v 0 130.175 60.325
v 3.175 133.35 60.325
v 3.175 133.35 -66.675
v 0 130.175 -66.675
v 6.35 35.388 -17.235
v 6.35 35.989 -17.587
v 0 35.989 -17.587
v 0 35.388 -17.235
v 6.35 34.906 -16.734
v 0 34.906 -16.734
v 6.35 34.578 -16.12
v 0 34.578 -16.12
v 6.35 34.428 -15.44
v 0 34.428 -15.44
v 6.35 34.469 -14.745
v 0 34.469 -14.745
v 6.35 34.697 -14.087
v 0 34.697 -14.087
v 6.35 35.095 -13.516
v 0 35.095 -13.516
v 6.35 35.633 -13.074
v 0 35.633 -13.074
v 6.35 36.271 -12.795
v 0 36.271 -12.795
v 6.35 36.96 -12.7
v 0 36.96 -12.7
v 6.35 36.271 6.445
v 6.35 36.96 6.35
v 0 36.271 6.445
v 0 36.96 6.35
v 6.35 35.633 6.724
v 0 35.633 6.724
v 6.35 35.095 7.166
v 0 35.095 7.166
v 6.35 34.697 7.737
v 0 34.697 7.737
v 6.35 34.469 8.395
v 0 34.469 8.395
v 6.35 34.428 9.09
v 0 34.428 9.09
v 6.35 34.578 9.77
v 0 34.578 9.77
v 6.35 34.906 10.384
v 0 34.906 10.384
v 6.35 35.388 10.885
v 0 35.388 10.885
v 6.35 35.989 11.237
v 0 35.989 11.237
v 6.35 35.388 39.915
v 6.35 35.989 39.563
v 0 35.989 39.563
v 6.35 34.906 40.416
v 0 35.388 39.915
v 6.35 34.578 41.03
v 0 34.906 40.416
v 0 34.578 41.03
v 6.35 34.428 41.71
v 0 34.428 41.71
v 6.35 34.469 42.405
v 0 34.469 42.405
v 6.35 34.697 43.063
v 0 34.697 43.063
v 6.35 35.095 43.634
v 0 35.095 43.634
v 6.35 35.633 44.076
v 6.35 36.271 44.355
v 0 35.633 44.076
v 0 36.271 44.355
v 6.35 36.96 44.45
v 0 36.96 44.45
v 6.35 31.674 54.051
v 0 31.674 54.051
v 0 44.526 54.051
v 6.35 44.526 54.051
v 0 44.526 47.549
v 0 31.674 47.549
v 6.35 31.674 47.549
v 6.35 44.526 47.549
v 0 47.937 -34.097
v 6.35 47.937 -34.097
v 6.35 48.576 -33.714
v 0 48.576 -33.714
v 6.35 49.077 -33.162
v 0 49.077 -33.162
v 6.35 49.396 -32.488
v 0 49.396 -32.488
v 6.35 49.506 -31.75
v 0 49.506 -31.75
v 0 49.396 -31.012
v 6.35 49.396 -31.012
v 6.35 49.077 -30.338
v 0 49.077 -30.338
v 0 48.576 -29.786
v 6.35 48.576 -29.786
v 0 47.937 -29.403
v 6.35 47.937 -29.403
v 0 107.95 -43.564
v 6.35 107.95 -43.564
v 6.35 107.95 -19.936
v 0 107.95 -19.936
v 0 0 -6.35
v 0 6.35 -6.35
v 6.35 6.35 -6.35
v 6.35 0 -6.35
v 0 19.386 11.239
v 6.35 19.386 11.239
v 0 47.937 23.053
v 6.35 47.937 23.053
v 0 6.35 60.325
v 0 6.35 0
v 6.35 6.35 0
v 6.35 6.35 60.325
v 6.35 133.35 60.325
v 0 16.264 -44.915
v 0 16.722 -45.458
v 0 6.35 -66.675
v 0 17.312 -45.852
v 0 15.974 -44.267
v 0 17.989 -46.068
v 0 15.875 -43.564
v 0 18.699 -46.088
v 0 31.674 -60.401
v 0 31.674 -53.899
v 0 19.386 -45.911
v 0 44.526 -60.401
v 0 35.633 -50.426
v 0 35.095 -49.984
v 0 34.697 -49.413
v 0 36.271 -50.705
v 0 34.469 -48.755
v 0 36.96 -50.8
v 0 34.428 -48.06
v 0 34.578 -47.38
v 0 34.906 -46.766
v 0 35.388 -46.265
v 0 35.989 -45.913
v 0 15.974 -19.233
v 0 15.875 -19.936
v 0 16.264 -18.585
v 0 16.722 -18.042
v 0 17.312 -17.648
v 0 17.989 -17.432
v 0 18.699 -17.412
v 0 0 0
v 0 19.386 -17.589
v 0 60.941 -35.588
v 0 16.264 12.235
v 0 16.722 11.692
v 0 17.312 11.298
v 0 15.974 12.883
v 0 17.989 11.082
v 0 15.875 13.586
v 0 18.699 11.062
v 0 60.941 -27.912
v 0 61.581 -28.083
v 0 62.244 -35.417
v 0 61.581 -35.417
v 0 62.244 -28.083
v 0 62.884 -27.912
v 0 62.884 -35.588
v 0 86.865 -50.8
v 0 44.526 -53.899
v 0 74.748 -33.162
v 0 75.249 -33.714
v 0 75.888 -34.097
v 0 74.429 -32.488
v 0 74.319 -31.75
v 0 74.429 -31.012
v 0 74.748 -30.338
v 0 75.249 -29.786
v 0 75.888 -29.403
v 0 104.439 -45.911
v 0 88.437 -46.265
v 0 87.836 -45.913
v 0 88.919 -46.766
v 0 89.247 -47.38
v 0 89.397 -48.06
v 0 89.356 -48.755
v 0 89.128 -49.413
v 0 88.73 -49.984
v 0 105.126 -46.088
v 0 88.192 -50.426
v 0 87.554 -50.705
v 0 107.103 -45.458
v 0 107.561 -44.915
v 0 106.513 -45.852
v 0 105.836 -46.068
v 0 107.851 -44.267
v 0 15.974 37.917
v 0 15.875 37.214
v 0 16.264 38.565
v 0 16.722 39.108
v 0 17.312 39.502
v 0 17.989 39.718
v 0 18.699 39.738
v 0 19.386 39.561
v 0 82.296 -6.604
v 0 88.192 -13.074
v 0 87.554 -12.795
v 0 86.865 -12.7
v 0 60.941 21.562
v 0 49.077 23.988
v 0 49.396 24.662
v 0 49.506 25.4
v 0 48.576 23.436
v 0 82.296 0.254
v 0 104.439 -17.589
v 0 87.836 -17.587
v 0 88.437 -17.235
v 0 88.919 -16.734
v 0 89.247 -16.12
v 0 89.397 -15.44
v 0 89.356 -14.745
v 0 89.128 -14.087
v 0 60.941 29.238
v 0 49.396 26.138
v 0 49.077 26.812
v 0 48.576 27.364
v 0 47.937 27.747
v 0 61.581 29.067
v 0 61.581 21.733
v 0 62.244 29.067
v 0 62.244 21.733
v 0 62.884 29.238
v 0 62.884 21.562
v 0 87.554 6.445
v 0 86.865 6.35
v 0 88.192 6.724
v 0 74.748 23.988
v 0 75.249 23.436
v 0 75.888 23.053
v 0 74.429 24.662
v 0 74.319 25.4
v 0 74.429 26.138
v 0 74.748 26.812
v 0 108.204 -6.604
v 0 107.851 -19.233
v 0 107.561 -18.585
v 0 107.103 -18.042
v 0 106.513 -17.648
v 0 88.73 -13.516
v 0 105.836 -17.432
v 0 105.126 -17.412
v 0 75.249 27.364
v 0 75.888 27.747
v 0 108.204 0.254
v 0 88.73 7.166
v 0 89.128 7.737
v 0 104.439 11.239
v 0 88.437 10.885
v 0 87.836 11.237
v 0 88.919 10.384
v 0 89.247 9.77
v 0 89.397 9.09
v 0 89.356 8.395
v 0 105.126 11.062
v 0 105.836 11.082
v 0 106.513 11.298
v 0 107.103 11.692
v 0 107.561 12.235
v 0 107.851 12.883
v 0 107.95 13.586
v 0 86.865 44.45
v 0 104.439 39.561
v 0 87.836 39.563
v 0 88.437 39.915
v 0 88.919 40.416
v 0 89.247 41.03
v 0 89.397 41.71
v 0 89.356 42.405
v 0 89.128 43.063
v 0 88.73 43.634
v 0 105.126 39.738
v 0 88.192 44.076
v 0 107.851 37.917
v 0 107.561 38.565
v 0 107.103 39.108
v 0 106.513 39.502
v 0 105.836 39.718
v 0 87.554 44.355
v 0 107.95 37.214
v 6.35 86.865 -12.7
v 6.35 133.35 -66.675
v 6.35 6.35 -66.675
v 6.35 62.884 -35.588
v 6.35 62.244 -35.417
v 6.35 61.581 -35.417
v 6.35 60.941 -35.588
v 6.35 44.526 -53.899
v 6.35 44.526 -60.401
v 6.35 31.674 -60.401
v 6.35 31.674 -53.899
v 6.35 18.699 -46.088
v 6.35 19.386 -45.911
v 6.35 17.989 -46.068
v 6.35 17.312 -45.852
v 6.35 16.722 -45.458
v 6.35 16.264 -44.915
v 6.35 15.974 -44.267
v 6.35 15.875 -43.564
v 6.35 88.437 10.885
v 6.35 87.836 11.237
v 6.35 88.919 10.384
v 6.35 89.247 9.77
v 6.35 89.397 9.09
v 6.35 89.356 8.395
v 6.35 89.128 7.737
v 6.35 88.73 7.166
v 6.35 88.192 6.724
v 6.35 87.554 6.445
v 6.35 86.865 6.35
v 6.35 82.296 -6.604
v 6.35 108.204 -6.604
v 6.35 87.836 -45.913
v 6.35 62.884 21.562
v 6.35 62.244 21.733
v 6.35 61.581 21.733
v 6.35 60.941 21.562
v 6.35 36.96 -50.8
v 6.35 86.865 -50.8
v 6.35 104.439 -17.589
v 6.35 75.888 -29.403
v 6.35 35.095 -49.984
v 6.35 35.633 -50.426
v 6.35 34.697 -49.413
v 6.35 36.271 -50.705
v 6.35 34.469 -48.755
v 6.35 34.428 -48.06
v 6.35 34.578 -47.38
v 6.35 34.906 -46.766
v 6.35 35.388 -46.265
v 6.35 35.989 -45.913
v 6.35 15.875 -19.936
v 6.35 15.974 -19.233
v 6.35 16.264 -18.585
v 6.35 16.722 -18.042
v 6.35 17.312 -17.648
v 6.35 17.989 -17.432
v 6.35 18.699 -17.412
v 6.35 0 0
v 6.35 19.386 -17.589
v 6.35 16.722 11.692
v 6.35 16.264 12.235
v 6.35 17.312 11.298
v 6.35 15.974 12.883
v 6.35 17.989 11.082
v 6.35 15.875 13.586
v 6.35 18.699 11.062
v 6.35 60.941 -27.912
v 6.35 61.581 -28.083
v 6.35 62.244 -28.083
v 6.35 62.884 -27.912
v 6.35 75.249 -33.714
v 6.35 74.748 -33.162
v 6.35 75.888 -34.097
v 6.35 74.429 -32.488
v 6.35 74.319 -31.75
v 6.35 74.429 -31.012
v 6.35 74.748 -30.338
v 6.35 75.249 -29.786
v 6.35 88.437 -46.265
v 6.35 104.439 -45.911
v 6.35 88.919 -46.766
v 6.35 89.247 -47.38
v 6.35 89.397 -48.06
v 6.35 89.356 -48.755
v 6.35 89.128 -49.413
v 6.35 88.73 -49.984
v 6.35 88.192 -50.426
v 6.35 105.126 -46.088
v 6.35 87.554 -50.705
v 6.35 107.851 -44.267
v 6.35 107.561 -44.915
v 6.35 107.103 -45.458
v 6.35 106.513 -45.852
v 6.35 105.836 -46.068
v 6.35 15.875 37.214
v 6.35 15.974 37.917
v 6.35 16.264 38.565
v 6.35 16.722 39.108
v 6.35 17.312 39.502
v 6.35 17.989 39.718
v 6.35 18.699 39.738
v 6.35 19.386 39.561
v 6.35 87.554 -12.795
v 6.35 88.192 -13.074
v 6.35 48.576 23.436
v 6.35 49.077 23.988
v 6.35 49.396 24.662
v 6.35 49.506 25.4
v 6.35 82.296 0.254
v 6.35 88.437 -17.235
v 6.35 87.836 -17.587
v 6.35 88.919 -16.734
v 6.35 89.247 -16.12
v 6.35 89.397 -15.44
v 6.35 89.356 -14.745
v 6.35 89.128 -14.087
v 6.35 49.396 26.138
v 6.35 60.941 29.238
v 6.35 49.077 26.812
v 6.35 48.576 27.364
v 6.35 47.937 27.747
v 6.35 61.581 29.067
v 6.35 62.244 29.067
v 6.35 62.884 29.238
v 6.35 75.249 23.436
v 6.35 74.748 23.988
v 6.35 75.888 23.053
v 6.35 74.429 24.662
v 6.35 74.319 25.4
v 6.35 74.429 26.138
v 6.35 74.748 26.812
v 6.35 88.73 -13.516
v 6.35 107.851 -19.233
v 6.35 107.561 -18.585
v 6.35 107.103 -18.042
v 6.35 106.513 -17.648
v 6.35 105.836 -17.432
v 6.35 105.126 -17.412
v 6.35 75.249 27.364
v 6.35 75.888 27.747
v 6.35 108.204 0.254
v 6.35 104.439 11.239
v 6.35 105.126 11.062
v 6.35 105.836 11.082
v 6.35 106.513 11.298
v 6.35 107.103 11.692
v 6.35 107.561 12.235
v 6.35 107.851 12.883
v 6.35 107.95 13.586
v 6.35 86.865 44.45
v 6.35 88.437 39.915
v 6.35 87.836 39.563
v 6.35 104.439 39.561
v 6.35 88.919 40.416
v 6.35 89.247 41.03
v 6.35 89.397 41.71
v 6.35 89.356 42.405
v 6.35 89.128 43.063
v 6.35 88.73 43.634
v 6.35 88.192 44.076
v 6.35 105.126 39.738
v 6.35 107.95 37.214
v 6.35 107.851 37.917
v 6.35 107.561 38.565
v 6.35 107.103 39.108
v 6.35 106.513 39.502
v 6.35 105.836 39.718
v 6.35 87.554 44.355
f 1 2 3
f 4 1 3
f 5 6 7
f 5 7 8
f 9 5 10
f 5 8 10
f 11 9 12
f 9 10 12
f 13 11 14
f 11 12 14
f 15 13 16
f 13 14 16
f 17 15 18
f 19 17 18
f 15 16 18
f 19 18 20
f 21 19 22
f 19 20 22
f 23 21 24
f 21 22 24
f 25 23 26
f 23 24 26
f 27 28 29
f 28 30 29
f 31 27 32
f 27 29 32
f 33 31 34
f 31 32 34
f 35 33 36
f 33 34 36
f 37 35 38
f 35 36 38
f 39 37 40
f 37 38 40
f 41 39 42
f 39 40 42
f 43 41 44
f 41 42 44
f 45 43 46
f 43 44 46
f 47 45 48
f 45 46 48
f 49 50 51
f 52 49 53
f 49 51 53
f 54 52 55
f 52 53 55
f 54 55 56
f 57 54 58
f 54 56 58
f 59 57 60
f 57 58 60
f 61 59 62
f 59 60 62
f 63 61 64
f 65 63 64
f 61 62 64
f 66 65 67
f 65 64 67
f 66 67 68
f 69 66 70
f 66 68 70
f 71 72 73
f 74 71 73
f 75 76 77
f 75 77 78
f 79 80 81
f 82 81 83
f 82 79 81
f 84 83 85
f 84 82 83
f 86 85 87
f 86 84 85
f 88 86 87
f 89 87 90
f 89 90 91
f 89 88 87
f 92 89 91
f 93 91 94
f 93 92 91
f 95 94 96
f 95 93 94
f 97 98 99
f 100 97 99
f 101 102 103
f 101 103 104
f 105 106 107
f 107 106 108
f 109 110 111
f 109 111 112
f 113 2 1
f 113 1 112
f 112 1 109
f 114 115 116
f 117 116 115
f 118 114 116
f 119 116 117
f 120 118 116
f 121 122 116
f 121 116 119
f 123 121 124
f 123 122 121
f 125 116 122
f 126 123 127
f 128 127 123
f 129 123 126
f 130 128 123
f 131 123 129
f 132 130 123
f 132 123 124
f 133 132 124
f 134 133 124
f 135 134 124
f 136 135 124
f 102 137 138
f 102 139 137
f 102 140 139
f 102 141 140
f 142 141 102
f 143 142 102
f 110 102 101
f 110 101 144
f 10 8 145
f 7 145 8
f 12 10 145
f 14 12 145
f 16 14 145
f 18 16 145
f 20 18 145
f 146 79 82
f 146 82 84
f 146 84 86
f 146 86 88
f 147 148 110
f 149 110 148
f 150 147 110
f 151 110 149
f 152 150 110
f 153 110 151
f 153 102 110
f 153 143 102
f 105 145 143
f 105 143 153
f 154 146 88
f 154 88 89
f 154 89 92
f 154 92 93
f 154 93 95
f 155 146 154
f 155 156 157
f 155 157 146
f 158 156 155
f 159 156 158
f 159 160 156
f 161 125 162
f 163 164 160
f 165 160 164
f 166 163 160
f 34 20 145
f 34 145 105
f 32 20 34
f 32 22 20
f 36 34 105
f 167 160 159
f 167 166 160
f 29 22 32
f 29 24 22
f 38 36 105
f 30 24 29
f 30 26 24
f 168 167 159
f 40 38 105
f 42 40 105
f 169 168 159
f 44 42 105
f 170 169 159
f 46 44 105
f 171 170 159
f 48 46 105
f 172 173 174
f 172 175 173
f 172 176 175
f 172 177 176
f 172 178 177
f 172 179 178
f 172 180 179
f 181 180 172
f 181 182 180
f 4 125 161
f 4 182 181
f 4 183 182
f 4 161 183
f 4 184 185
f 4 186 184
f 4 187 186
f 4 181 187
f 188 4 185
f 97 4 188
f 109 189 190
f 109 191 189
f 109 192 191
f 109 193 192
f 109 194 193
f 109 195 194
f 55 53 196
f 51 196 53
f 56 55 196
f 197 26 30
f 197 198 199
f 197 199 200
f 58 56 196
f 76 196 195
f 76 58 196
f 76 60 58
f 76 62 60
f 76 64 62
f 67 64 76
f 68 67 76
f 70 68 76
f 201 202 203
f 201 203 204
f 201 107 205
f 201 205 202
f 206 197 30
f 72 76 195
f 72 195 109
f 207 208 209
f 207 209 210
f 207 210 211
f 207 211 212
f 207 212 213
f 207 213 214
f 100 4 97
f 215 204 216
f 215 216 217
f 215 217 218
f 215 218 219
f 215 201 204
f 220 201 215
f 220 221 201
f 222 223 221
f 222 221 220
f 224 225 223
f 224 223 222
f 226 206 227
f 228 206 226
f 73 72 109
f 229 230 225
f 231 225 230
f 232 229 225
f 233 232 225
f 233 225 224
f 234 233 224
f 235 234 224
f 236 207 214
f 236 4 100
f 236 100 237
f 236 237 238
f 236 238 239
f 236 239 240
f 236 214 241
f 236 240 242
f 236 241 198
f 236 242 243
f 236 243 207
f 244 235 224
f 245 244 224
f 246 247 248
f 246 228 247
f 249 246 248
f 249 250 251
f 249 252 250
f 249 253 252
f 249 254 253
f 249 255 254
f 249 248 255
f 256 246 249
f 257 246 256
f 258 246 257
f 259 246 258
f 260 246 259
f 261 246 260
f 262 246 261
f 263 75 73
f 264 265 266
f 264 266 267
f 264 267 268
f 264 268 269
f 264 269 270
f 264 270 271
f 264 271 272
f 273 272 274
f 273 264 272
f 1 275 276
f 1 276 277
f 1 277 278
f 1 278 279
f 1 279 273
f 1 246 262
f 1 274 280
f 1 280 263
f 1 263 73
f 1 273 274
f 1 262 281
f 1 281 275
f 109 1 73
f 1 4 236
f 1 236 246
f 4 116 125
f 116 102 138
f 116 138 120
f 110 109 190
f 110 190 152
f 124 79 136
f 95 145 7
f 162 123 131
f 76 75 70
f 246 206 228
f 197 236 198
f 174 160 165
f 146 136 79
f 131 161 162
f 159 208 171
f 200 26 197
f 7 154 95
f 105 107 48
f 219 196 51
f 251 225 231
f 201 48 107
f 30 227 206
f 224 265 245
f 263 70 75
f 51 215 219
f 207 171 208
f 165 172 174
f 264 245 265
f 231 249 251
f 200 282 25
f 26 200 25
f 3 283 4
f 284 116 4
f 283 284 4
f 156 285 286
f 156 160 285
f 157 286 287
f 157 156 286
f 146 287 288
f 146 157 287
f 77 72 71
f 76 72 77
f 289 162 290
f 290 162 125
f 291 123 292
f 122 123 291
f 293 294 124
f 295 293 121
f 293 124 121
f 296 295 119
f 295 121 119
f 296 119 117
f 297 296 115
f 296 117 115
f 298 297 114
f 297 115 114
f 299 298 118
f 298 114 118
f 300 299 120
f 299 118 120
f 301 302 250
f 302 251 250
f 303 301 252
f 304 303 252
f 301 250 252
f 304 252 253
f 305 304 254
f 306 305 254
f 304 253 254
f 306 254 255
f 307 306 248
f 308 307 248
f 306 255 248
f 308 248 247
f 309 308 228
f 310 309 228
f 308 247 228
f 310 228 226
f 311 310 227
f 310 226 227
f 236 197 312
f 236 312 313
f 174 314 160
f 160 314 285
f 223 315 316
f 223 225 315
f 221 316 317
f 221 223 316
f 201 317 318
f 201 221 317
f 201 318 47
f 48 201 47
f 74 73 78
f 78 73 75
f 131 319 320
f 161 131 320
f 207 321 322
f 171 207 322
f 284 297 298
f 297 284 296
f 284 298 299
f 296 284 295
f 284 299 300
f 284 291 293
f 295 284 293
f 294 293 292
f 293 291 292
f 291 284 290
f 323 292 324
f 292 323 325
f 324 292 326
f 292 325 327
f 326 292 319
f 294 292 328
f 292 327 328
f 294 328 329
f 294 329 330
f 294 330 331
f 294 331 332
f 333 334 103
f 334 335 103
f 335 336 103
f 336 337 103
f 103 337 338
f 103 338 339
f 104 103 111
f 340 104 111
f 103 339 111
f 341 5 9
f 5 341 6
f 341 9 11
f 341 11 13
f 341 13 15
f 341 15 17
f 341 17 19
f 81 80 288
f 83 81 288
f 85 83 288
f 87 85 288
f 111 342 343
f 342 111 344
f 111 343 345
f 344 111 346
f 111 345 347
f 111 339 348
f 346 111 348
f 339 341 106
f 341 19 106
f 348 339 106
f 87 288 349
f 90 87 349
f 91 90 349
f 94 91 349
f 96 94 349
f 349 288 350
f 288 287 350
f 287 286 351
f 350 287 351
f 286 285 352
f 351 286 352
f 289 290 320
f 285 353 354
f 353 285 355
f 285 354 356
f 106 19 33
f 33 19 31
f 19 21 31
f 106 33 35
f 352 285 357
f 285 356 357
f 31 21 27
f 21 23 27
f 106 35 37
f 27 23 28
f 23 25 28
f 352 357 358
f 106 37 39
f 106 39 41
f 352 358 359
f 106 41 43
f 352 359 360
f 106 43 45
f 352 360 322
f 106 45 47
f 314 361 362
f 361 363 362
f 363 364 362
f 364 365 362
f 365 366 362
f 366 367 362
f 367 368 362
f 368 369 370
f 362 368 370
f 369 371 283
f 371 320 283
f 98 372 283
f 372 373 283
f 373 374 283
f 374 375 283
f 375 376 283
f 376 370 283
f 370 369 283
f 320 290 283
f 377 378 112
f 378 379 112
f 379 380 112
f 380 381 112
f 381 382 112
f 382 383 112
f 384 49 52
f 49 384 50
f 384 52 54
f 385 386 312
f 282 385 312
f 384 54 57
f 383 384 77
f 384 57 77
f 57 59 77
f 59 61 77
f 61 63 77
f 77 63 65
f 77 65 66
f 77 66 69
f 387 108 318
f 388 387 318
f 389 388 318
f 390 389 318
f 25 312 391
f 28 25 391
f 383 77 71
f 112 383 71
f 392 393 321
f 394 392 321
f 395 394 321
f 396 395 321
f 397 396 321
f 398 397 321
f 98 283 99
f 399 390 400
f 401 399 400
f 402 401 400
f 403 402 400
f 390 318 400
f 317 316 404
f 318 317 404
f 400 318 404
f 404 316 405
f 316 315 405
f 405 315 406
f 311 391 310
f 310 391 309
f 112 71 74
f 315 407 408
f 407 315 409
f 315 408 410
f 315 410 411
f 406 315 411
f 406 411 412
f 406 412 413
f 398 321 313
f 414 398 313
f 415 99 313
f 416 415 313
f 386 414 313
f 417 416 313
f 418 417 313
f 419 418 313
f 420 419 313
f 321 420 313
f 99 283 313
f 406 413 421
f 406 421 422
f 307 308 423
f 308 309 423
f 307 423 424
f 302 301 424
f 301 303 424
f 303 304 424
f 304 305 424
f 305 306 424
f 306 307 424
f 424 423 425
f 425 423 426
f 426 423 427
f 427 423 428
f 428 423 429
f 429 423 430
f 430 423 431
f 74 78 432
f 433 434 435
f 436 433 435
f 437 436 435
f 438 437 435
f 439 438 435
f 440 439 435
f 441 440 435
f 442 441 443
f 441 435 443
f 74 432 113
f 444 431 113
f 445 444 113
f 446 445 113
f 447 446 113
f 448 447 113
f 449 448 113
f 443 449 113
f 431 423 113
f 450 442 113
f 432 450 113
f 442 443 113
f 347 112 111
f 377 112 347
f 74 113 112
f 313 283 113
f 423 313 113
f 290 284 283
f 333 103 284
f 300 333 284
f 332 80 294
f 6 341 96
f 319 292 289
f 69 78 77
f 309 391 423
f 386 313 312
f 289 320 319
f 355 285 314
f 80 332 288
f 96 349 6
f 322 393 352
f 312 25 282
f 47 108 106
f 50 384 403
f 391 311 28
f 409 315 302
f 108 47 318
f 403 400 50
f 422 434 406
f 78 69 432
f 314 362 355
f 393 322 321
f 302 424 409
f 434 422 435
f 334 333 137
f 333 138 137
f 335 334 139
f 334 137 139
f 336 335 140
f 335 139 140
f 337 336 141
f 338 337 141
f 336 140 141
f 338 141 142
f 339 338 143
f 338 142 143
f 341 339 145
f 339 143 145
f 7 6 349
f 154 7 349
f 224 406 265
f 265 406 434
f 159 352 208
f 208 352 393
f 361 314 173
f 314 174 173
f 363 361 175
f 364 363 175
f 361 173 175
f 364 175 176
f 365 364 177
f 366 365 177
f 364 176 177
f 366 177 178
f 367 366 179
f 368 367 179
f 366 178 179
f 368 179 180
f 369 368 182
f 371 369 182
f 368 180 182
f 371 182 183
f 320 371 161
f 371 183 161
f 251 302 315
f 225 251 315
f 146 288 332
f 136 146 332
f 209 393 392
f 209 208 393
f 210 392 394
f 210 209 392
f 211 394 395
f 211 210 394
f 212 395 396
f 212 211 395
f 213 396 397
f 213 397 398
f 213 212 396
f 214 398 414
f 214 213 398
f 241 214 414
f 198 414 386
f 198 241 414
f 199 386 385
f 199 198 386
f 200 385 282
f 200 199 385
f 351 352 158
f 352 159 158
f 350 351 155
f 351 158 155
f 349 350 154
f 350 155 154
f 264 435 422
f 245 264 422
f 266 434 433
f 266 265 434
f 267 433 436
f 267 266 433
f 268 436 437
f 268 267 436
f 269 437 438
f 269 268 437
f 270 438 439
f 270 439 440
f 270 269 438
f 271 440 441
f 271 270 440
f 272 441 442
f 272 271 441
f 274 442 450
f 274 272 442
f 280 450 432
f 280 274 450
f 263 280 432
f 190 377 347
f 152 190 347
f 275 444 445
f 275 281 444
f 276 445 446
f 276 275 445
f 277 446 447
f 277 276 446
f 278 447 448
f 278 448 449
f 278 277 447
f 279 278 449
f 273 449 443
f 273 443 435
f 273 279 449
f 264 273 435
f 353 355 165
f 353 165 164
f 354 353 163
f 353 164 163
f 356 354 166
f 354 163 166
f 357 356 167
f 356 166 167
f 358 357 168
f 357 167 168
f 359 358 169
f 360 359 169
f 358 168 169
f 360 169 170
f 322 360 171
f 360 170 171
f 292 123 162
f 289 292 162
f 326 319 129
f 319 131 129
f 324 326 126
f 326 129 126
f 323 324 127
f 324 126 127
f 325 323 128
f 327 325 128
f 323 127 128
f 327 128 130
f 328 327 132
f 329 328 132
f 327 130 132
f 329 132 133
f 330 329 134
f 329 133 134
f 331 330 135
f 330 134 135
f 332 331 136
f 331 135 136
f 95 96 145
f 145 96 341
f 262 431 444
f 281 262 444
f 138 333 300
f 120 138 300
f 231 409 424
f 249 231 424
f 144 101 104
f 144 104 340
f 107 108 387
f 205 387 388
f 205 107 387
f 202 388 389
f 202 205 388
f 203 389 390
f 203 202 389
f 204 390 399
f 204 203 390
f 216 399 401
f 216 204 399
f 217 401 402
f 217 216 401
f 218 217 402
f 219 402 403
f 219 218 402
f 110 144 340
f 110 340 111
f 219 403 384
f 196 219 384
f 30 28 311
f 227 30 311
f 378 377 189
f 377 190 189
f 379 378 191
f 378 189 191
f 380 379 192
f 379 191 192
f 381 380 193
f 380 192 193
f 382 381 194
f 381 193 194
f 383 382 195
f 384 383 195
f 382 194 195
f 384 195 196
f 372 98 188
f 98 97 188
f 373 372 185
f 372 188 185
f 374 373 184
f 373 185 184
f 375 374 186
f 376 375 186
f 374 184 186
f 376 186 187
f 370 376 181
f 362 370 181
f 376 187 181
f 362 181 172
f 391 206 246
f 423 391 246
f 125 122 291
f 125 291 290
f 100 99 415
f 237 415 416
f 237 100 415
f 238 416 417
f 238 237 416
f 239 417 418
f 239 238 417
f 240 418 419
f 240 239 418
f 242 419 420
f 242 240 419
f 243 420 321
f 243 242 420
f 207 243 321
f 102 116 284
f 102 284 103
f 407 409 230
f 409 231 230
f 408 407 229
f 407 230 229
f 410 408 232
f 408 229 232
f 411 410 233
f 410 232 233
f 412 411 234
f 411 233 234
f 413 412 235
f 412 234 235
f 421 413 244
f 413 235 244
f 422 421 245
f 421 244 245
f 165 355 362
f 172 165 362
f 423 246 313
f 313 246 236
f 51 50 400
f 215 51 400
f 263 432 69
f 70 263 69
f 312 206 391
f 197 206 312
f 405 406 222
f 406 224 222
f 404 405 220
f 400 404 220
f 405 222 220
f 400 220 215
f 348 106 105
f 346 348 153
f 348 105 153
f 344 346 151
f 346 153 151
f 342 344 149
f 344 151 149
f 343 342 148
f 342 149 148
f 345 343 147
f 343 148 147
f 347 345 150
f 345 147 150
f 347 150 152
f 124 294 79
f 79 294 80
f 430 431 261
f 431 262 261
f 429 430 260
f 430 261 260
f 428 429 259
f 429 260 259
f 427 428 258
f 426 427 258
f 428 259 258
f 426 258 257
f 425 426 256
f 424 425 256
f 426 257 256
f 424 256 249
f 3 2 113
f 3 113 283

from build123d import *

# Parameters (mm, degrees)
SKETCH4_W           = 6.858
SKETCH4_H           = 25.908
SKETCH4_W_2         = 6.5024
SKETCH4_H_2         = 12.8524
BOSS_EXTRUDE1_DEPTH = 6.35
CUT_EXTRUDE1_DEPTH  = 150.225
FILLET1_R           = 2.54
CHAMFER1_SIZE       = 3.175


with BuildPart() as part:
    # Sketch4 → Boss-Extrude1 (new body)
    with BuildSketch(Plane(origin=(0, 0, 0), x_dir=(0, 0, -1), z_dir=(1, 0, 0))):
        Polygon((0, 6.35), (-60.325, 6.35), (-60.325, 32.004), (-60.325, 44.704), (-60.325, 133.35), (66.675, 133.35), (66.675, 44.704), (66.675, 32.004), (66.675, 6.35), (6.35, 6.35), (6.35, 0), (0, 0), align=None)
        with Locations((3.175, 95.25)):
            Rectangle(SKETCH4_W, SKETCH4_H, mode=Mode.SUBTRACT)
        with Locations((-50.8, 38.1)):
            Rectangle(SKETCH4_W_2, SKETCH4_H_2, mode=Mode.SUBTRACT)
        with Locations((57.15, 38.1)):
            Rectangle(SKETCH4_W_2, SKETCH4_H_2, mode=Mode.SUBTRACT)
    extrude(amount=BOSS_EXTRUDE1_DEPTH)

    # Sketch5 → Cut-Extrude1 (cut, through all)
    with BuildSketch(Plane(origin=(6.35, 0, 0), x_dir=(0, 0, -1), z_dir=(1, 0, 0))):
        Polygon((-28.836084591, 61.9125), (-44.45, 99.646128904), (-44.45, 24.178871096), align=None)
        Polygon((-9.786084591, 107.95), (-41.013915409, 107.95), (-25.4, 70.216371096), align=None)
        Polygon((-9.786084591, 15.875), (-25.4, 53.608628904), (-41.013915409, 15.875), align=None)
        Polygon((28.313915409, 61.9125), (12.7, 99.646128904), (12.7, 24.178871096), align=None)
        Polygon((47.363915409, 107.95), (16.136084591, 107.95), (31.75, 70.216371096), align=None)
        Polygon((50.8, 99.646128904), (35.186084591, 61.9125), (50.8, 24.178871096), align=None)
        Polygon((47.363915409, 15.875), (31.75, 53.608628904), (16.136084591, 15.875), align=None)
        Polygon((-6.35, 99.646128904), (-21.963915409, 61.9125), (-6.35, 24.178871096), align=None)
    extrude(amount=-CUT_EXTRUDE1_DEPTH, mode=Mode.SUBTRACT)

    # Fillet1
    fillet1_edges = [part.edges().sort_by_distance(p)[0] for p in [
        (3.175, 53.608628904, 25.4),
        (3.175, 15.875, 9.786084591),
        (3.175, 70.216371096, -31.75),
        (3.175, 107.95, -16.136084591),
        (3.175, 107.95, -47.363915409),
        (3.175, 61.9125, -28.313915409),
        (3.175, 24.178871096, -12.7),
        (3.175, 99.646128904, -12.7),
        (3.175, 15.875, -47.363915409),
        (3.175, 15.875, -16.136084591),
        (3.175, 53.608628904, -31.75),
        (3.175, 24.178871096, -50.8),
        (3.175, 61.9125, -35.186084591),
        (3.175, 99.646128904, -50.8),
        (3.175, 61.9125, 21.963915409),
        (3.175, 99.646128904, 6.35),
        (3.175, 24.178871096, 6.35),
        (3.175, 24.178871096, 44.45),
        (3.175, 99.646128904, 44.45),
        (3.175, 61.9125, 28.836084591),
        (3.175, 70.216371096, 25.4),
        (3.175, 107.95, 41.013915409),
        (3.175, 107.95, 9.786084591),
        (3.175, 15.875, 41.013915409),
    ]]
    fillet(fillet1_edges, radius=FILLET1_R)

    # Chamfer1
    chamfer1_edges = [part.edges().sort_by_distance(p)[0] for p in [
        (0, 133.35, -3.175),
    ]]
    chamfer(chamfer1_edges, length=CHAMFER1_SIZE)


solid = part.part
